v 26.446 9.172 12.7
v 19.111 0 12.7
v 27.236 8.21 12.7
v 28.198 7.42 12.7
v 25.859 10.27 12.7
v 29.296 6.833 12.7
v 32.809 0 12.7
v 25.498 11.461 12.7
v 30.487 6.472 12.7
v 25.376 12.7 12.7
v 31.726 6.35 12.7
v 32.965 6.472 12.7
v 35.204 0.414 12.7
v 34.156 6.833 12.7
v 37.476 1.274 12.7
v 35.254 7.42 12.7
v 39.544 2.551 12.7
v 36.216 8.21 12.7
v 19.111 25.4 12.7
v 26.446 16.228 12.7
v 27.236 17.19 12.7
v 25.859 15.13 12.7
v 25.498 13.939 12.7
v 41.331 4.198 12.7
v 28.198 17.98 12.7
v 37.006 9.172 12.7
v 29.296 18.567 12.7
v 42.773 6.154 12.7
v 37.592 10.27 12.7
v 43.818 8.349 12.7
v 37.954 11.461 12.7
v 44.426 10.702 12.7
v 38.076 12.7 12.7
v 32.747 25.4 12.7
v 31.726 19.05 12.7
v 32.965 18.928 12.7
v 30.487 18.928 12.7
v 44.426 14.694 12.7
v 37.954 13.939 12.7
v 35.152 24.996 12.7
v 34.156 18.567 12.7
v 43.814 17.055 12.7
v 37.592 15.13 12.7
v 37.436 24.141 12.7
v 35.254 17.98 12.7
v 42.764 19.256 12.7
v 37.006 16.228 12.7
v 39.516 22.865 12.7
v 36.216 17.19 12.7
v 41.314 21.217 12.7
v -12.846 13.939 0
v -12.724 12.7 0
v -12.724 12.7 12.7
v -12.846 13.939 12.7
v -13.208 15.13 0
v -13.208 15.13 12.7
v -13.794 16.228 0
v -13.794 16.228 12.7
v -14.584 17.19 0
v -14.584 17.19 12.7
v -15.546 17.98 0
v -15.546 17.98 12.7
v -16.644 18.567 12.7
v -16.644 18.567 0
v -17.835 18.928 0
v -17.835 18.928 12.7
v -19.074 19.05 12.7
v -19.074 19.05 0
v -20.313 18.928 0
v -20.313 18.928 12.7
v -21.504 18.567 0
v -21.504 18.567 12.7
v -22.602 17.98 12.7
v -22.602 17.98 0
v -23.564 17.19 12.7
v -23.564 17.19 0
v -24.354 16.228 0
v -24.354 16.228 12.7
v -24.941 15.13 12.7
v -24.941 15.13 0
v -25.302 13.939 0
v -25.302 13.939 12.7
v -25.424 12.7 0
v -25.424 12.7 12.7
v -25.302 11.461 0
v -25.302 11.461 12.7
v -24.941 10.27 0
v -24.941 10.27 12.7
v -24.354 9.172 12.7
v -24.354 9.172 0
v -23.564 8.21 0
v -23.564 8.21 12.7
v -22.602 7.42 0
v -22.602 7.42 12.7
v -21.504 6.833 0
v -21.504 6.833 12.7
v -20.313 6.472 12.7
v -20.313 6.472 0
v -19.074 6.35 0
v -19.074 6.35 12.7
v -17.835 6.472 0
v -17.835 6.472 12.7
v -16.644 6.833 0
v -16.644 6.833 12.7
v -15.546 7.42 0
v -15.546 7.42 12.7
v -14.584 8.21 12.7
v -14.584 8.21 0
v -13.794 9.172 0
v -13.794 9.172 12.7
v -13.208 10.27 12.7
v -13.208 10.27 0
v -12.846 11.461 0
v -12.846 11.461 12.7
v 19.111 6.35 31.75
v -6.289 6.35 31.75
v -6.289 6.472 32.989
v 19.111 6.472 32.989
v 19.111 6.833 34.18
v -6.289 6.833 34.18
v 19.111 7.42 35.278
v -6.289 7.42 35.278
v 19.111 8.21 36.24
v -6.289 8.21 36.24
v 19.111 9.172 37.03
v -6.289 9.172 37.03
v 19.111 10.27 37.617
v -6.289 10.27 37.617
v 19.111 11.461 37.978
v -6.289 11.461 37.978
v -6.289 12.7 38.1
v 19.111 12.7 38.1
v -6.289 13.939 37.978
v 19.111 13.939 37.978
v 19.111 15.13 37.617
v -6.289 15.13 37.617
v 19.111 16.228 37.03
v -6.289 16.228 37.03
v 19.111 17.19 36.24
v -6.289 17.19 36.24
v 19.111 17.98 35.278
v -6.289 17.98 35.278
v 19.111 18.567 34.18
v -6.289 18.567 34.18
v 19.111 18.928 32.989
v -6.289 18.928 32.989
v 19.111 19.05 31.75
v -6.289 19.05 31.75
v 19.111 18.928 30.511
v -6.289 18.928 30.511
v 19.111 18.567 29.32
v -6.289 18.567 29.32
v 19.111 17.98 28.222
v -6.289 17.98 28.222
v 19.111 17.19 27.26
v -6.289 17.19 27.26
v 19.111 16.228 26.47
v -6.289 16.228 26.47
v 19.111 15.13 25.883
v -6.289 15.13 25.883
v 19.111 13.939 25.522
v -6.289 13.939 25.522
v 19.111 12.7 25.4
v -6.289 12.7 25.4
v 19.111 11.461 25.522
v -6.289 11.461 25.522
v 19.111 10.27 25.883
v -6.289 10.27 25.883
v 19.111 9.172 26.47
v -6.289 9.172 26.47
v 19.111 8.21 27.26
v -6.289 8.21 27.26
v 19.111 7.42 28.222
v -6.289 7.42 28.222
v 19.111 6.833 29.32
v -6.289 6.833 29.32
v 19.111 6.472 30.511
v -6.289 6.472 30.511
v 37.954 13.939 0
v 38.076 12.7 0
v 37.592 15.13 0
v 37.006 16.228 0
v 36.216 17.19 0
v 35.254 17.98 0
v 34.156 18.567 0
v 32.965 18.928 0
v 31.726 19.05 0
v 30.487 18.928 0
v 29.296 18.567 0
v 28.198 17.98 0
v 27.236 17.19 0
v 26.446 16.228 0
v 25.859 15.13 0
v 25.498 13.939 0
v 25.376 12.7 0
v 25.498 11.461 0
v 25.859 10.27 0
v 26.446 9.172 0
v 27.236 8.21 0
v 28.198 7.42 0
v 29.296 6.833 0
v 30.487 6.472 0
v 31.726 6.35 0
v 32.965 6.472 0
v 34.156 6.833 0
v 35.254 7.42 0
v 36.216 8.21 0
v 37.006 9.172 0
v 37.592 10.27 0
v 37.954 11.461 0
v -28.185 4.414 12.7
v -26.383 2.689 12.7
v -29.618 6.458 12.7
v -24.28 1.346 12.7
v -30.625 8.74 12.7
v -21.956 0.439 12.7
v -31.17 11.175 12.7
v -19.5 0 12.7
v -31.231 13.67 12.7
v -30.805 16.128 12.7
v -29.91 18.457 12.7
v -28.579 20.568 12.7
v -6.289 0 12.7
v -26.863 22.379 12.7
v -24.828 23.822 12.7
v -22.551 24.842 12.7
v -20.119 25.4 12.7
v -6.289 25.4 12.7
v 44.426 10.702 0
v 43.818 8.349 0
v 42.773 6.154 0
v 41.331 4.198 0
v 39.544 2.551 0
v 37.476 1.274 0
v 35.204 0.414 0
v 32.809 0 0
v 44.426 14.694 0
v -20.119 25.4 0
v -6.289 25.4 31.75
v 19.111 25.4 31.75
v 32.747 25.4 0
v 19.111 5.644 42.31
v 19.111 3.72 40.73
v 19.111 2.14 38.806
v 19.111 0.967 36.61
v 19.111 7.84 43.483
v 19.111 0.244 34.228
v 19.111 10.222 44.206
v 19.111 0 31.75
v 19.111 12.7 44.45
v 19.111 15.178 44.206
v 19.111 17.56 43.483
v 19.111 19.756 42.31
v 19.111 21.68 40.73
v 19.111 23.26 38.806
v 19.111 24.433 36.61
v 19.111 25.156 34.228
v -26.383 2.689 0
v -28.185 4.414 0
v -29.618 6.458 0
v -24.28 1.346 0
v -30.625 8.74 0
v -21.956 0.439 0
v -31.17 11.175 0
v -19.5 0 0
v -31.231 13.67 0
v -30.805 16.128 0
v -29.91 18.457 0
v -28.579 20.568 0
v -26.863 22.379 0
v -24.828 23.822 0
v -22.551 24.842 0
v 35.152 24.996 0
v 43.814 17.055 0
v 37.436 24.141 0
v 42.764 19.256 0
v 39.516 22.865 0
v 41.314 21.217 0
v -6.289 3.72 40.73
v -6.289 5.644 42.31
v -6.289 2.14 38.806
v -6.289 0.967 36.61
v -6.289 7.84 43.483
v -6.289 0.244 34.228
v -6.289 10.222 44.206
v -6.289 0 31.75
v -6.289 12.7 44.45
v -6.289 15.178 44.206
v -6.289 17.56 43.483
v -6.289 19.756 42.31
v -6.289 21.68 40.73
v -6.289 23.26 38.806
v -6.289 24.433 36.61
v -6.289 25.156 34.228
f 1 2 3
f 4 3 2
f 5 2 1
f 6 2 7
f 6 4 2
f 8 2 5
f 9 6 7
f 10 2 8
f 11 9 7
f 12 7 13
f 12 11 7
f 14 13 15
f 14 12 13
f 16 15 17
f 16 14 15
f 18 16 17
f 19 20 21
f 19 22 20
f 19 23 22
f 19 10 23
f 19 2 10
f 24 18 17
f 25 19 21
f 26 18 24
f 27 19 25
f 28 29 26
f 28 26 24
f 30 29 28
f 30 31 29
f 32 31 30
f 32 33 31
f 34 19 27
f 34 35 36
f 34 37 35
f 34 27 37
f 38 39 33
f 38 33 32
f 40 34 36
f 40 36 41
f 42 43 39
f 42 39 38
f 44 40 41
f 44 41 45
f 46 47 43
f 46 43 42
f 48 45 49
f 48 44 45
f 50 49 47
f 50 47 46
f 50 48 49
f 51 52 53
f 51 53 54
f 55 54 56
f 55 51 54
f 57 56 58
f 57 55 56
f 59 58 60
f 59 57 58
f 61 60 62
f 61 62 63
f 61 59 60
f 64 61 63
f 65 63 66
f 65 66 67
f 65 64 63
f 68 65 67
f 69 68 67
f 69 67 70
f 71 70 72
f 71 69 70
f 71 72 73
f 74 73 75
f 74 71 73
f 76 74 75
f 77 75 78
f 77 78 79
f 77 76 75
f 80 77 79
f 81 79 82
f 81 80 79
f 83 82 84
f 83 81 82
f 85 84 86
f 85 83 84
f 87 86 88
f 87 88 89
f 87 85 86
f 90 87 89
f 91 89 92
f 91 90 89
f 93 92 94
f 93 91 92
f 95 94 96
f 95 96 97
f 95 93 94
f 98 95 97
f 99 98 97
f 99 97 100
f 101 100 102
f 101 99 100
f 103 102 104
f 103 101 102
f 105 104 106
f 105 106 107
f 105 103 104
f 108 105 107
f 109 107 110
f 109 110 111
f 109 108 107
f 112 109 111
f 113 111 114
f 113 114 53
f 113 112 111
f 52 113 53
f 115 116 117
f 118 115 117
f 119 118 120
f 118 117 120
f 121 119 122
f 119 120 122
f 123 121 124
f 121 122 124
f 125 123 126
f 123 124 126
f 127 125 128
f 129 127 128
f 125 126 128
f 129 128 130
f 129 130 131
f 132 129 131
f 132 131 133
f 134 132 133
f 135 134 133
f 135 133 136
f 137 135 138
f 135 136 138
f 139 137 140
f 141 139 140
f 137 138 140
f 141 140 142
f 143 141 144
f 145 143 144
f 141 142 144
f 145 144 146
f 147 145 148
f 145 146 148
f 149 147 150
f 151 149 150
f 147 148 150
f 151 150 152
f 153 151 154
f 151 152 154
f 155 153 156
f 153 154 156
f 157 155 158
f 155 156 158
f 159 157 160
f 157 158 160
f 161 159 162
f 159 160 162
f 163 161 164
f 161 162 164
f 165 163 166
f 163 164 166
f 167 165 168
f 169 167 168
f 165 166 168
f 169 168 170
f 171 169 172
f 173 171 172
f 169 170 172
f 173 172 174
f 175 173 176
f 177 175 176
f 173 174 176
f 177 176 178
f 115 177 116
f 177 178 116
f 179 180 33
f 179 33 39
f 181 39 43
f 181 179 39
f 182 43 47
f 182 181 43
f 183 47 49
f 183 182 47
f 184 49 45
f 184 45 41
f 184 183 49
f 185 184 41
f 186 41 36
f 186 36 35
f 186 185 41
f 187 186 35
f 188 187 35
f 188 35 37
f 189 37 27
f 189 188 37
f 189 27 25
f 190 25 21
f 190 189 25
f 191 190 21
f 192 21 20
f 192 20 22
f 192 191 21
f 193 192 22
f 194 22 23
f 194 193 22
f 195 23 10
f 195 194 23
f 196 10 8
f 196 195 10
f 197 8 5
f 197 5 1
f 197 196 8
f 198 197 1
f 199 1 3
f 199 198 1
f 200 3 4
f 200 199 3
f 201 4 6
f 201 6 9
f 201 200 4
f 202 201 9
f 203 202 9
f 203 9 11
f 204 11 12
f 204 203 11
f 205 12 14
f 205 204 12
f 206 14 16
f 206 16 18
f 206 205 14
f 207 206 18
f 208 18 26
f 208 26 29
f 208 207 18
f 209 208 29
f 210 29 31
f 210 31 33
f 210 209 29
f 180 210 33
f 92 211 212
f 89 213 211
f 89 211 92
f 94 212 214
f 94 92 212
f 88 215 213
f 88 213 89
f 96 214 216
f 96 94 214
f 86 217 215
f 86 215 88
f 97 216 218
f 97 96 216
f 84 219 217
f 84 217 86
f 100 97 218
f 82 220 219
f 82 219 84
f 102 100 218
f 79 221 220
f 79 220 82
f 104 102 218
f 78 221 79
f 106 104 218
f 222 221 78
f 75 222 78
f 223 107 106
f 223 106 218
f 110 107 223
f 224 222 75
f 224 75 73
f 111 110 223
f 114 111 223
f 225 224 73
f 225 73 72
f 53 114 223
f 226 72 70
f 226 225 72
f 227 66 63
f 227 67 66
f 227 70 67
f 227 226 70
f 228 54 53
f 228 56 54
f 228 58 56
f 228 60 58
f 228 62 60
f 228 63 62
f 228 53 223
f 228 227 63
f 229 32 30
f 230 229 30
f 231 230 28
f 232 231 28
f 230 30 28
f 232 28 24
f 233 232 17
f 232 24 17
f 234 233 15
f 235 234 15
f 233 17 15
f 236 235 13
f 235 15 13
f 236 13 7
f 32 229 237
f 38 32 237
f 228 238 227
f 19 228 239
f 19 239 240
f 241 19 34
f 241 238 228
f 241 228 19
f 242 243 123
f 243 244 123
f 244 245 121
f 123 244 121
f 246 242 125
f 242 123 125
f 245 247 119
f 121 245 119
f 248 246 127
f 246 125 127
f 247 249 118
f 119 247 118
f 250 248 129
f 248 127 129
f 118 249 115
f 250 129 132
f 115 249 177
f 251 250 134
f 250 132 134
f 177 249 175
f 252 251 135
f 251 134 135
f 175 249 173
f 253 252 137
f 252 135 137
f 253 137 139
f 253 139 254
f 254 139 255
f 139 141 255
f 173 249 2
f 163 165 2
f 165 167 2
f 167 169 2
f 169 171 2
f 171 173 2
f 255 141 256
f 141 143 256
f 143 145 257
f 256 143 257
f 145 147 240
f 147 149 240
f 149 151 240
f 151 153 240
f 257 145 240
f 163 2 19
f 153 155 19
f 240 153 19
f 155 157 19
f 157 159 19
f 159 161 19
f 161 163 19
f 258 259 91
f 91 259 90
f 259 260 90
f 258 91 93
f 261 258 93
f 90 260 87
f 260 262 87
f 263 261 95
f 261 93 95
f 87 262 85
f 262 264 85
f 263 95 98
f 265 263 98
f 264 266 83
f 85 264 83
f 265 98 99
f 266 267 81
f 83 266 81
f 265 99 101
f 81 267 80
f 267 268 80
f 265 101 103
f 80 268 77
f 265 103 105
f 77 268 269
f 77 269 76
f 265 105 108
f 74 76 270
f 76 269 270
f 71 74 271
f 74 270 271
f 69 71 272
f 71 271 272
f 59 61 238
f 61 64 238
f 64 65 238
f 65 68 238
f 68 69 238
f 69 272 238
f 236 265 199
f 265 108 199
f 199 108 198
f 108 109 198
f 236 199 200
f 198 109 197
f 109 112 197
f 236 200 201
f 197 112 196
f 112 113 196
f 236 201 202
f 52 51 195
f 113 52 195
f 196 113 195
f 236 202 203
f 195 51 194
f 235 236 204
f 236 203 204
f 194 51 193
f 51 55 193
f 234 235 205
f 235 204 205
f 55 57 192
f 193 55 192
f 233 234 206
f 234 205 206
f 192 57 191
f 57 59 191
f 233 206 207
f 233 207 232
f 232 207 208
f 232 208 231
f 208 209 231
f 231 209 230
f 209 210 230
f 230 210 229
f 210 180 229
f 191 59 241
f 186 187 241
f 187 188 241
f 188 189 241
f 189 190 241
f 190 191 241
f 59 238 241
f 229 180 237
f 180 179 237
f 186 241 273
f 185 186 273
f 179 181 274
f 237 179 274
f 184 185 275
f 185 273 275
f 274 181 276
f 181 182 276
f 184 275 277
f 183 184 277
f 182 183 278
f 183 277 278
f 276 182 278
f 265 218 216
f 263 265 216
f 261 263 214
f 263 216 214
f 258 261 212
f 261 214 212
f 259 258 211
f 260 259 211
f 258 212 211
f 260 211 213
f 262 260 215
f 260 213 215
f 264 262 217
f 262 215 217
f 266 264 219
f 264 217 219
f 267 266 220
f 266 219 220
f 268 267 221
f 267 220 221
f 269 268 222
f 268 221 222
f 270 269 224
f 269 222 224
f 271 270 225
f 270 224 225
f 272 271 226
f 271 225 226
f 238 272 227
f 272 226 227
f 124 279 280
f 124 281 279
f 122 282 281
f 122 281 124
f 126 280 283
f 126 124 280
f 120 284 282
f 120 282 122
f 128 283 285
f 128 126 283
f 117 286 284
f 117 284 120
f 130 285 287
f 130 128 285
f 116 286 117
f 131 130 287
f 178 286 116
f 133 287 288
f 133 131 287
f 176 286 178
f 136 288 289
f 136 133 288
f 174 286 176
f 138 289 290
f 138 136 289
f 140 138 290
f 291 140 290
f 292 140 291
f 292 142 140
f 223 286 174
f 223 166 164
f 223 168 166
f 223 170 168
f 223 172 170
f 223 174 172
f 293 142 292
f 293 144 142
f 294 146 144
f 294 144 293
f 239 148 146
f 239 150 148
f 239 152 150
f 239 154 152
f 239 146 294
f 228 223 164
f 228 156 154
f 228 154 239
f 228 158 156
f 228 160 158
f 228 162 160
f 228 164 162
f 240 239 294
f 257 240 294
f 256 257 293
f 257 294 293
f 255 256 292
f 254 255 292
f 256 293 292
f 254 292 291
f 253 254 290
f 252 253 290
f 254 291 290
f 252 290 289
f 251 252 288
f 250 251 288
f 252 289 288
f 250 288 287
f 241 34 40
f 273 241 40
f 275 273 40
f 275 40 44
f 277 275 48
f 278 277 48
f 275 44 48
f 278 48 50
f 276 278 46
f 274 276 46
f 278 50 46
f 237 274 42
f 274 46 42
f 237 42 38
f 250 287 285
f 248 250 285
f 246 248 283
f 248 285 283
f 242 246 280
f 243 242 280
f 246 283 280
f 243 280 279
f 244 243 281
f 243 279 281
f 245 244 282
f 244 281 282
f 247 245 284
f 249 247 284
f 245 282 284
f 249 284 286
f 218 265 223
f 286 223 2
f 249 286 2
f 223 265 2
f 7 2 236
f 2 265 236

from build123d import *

# Parameters (mm, degrees)
F0_W     = 76.2
F0_H     = 25.4
F0_R     = 6.35
F1_DEPTH = 12.7
F3_DEPTH = 12.7
F4_W     = 25.4
F4_H     = 25.4
F5_DEPTH = 44.45
F7_DEPTH = 25.4
F8_R     = 6.35
F9_DEPTH = 25.4


with BuildPart() as f1:
    # F0 (on Top) → F1 (new body)
    with BuildSketch(Plane.XY):
        with Locations((6.3257696523, 12.7)):
            Rectangle(F0_W, F0_H)
        with Locations((-19.0742303477, 12.7)):
            Circle(F0_R, mode=Mode.SUBTRACT)
        with Locations((31.7257696523, 12.7)):
            Circle(F0_R, mode=Mode.SUBTRACT)
    extrude(amount=F1_DEPTH)

    # F2 (on face) → F3 (cut)
    with BuildSketch(Plane.XY.offset(12.7)):
        with BuildLine():
            ThreePointArc((-19.4995366037, 0), (-31.2612298583, 12.4208945177), (-20.1185699552, 25.4))
            Line((-20.1185699552, 25.4), (-31.7742303477, 25.4))
            Line((-31.7742303477, 25.4), (-31.7742303477, 0))
            Line((-31.7742303477, 0), (-19.4995366037, 0))
        make_face()
        with BuildLine():
            Line((44.4257696523, 25.4), (32.7468659845, 25.4))
            ThreePointArc((32.7468659845, 25.4), (40.454102952, 22.0844190513), (44.4257696523, 14.6938546396))
            Line((44.4257696523, 14.6938546396), (44.4257696523, 25.4))
        make_face()
        with BuildLine():
            ThreePointArc((44.4257696523, 10.701621252), (40.4769444267, 3.3320470648), (32.8087434173, 0))
            Line((32.8087434173, 0), (44.4257696523, 0))
            Line((44.4257696523, 0), (44.4257696523, 10.701621252))
        make_face()
    extrude(amount=-F3_DEPTH, mode=Mode.SUBTRACT)

    # F4 (on Top) → F5 (join)
    with BuildSketch(Plane.XY):
        with Locations((6.41142525, 12.7)):
            Rectangle(F4_W, F4_H)
    extrude(amount=F5_DEPTH)

    # F6 (on face) → F7 (cut)
    with BuildSketch(Plane(origin=(-6.28857475, 0, 0), x_dir=(0, -1, 0), z_dir=(-1, 0, 0))):
        with BuildLine():
            ThreePointArc((-25.4, 31.75), (-21.6802561211, 40.7302561211), (-12.7, 44.45))
            Line((-12.7, 44.45), (-25.4, 44.45))
            Line((-25.4, 44.45), (-25.4, 31.75))
        make_face()
        with BuildLine():
            ThreePointArc((-12.7, 44.45), (-3.7197438789, 40.7302561211), (0, 31.75))
            Line((0, 31.75), (0, 44.45))
            Line((0, 44.45), (-12.7, 44.45))
        make_face()
    extrude(amount=-F7_DEPTH, mode=Mode.SUBTRACT)

    # F8 (on face) → F9 (cut)
    with BuildSketch(Plane(origin=(-6.28857475, 0, 0), x_dir=(0, -1, 0), z_dir=(-1, 0, 0))):
        with Locations((-12.7, 31.75)):
            Circle(F8_R)
    extrude(amount=-F9_DEPTH, mode=Mode.SUBTRACT)


solid = f1.part
